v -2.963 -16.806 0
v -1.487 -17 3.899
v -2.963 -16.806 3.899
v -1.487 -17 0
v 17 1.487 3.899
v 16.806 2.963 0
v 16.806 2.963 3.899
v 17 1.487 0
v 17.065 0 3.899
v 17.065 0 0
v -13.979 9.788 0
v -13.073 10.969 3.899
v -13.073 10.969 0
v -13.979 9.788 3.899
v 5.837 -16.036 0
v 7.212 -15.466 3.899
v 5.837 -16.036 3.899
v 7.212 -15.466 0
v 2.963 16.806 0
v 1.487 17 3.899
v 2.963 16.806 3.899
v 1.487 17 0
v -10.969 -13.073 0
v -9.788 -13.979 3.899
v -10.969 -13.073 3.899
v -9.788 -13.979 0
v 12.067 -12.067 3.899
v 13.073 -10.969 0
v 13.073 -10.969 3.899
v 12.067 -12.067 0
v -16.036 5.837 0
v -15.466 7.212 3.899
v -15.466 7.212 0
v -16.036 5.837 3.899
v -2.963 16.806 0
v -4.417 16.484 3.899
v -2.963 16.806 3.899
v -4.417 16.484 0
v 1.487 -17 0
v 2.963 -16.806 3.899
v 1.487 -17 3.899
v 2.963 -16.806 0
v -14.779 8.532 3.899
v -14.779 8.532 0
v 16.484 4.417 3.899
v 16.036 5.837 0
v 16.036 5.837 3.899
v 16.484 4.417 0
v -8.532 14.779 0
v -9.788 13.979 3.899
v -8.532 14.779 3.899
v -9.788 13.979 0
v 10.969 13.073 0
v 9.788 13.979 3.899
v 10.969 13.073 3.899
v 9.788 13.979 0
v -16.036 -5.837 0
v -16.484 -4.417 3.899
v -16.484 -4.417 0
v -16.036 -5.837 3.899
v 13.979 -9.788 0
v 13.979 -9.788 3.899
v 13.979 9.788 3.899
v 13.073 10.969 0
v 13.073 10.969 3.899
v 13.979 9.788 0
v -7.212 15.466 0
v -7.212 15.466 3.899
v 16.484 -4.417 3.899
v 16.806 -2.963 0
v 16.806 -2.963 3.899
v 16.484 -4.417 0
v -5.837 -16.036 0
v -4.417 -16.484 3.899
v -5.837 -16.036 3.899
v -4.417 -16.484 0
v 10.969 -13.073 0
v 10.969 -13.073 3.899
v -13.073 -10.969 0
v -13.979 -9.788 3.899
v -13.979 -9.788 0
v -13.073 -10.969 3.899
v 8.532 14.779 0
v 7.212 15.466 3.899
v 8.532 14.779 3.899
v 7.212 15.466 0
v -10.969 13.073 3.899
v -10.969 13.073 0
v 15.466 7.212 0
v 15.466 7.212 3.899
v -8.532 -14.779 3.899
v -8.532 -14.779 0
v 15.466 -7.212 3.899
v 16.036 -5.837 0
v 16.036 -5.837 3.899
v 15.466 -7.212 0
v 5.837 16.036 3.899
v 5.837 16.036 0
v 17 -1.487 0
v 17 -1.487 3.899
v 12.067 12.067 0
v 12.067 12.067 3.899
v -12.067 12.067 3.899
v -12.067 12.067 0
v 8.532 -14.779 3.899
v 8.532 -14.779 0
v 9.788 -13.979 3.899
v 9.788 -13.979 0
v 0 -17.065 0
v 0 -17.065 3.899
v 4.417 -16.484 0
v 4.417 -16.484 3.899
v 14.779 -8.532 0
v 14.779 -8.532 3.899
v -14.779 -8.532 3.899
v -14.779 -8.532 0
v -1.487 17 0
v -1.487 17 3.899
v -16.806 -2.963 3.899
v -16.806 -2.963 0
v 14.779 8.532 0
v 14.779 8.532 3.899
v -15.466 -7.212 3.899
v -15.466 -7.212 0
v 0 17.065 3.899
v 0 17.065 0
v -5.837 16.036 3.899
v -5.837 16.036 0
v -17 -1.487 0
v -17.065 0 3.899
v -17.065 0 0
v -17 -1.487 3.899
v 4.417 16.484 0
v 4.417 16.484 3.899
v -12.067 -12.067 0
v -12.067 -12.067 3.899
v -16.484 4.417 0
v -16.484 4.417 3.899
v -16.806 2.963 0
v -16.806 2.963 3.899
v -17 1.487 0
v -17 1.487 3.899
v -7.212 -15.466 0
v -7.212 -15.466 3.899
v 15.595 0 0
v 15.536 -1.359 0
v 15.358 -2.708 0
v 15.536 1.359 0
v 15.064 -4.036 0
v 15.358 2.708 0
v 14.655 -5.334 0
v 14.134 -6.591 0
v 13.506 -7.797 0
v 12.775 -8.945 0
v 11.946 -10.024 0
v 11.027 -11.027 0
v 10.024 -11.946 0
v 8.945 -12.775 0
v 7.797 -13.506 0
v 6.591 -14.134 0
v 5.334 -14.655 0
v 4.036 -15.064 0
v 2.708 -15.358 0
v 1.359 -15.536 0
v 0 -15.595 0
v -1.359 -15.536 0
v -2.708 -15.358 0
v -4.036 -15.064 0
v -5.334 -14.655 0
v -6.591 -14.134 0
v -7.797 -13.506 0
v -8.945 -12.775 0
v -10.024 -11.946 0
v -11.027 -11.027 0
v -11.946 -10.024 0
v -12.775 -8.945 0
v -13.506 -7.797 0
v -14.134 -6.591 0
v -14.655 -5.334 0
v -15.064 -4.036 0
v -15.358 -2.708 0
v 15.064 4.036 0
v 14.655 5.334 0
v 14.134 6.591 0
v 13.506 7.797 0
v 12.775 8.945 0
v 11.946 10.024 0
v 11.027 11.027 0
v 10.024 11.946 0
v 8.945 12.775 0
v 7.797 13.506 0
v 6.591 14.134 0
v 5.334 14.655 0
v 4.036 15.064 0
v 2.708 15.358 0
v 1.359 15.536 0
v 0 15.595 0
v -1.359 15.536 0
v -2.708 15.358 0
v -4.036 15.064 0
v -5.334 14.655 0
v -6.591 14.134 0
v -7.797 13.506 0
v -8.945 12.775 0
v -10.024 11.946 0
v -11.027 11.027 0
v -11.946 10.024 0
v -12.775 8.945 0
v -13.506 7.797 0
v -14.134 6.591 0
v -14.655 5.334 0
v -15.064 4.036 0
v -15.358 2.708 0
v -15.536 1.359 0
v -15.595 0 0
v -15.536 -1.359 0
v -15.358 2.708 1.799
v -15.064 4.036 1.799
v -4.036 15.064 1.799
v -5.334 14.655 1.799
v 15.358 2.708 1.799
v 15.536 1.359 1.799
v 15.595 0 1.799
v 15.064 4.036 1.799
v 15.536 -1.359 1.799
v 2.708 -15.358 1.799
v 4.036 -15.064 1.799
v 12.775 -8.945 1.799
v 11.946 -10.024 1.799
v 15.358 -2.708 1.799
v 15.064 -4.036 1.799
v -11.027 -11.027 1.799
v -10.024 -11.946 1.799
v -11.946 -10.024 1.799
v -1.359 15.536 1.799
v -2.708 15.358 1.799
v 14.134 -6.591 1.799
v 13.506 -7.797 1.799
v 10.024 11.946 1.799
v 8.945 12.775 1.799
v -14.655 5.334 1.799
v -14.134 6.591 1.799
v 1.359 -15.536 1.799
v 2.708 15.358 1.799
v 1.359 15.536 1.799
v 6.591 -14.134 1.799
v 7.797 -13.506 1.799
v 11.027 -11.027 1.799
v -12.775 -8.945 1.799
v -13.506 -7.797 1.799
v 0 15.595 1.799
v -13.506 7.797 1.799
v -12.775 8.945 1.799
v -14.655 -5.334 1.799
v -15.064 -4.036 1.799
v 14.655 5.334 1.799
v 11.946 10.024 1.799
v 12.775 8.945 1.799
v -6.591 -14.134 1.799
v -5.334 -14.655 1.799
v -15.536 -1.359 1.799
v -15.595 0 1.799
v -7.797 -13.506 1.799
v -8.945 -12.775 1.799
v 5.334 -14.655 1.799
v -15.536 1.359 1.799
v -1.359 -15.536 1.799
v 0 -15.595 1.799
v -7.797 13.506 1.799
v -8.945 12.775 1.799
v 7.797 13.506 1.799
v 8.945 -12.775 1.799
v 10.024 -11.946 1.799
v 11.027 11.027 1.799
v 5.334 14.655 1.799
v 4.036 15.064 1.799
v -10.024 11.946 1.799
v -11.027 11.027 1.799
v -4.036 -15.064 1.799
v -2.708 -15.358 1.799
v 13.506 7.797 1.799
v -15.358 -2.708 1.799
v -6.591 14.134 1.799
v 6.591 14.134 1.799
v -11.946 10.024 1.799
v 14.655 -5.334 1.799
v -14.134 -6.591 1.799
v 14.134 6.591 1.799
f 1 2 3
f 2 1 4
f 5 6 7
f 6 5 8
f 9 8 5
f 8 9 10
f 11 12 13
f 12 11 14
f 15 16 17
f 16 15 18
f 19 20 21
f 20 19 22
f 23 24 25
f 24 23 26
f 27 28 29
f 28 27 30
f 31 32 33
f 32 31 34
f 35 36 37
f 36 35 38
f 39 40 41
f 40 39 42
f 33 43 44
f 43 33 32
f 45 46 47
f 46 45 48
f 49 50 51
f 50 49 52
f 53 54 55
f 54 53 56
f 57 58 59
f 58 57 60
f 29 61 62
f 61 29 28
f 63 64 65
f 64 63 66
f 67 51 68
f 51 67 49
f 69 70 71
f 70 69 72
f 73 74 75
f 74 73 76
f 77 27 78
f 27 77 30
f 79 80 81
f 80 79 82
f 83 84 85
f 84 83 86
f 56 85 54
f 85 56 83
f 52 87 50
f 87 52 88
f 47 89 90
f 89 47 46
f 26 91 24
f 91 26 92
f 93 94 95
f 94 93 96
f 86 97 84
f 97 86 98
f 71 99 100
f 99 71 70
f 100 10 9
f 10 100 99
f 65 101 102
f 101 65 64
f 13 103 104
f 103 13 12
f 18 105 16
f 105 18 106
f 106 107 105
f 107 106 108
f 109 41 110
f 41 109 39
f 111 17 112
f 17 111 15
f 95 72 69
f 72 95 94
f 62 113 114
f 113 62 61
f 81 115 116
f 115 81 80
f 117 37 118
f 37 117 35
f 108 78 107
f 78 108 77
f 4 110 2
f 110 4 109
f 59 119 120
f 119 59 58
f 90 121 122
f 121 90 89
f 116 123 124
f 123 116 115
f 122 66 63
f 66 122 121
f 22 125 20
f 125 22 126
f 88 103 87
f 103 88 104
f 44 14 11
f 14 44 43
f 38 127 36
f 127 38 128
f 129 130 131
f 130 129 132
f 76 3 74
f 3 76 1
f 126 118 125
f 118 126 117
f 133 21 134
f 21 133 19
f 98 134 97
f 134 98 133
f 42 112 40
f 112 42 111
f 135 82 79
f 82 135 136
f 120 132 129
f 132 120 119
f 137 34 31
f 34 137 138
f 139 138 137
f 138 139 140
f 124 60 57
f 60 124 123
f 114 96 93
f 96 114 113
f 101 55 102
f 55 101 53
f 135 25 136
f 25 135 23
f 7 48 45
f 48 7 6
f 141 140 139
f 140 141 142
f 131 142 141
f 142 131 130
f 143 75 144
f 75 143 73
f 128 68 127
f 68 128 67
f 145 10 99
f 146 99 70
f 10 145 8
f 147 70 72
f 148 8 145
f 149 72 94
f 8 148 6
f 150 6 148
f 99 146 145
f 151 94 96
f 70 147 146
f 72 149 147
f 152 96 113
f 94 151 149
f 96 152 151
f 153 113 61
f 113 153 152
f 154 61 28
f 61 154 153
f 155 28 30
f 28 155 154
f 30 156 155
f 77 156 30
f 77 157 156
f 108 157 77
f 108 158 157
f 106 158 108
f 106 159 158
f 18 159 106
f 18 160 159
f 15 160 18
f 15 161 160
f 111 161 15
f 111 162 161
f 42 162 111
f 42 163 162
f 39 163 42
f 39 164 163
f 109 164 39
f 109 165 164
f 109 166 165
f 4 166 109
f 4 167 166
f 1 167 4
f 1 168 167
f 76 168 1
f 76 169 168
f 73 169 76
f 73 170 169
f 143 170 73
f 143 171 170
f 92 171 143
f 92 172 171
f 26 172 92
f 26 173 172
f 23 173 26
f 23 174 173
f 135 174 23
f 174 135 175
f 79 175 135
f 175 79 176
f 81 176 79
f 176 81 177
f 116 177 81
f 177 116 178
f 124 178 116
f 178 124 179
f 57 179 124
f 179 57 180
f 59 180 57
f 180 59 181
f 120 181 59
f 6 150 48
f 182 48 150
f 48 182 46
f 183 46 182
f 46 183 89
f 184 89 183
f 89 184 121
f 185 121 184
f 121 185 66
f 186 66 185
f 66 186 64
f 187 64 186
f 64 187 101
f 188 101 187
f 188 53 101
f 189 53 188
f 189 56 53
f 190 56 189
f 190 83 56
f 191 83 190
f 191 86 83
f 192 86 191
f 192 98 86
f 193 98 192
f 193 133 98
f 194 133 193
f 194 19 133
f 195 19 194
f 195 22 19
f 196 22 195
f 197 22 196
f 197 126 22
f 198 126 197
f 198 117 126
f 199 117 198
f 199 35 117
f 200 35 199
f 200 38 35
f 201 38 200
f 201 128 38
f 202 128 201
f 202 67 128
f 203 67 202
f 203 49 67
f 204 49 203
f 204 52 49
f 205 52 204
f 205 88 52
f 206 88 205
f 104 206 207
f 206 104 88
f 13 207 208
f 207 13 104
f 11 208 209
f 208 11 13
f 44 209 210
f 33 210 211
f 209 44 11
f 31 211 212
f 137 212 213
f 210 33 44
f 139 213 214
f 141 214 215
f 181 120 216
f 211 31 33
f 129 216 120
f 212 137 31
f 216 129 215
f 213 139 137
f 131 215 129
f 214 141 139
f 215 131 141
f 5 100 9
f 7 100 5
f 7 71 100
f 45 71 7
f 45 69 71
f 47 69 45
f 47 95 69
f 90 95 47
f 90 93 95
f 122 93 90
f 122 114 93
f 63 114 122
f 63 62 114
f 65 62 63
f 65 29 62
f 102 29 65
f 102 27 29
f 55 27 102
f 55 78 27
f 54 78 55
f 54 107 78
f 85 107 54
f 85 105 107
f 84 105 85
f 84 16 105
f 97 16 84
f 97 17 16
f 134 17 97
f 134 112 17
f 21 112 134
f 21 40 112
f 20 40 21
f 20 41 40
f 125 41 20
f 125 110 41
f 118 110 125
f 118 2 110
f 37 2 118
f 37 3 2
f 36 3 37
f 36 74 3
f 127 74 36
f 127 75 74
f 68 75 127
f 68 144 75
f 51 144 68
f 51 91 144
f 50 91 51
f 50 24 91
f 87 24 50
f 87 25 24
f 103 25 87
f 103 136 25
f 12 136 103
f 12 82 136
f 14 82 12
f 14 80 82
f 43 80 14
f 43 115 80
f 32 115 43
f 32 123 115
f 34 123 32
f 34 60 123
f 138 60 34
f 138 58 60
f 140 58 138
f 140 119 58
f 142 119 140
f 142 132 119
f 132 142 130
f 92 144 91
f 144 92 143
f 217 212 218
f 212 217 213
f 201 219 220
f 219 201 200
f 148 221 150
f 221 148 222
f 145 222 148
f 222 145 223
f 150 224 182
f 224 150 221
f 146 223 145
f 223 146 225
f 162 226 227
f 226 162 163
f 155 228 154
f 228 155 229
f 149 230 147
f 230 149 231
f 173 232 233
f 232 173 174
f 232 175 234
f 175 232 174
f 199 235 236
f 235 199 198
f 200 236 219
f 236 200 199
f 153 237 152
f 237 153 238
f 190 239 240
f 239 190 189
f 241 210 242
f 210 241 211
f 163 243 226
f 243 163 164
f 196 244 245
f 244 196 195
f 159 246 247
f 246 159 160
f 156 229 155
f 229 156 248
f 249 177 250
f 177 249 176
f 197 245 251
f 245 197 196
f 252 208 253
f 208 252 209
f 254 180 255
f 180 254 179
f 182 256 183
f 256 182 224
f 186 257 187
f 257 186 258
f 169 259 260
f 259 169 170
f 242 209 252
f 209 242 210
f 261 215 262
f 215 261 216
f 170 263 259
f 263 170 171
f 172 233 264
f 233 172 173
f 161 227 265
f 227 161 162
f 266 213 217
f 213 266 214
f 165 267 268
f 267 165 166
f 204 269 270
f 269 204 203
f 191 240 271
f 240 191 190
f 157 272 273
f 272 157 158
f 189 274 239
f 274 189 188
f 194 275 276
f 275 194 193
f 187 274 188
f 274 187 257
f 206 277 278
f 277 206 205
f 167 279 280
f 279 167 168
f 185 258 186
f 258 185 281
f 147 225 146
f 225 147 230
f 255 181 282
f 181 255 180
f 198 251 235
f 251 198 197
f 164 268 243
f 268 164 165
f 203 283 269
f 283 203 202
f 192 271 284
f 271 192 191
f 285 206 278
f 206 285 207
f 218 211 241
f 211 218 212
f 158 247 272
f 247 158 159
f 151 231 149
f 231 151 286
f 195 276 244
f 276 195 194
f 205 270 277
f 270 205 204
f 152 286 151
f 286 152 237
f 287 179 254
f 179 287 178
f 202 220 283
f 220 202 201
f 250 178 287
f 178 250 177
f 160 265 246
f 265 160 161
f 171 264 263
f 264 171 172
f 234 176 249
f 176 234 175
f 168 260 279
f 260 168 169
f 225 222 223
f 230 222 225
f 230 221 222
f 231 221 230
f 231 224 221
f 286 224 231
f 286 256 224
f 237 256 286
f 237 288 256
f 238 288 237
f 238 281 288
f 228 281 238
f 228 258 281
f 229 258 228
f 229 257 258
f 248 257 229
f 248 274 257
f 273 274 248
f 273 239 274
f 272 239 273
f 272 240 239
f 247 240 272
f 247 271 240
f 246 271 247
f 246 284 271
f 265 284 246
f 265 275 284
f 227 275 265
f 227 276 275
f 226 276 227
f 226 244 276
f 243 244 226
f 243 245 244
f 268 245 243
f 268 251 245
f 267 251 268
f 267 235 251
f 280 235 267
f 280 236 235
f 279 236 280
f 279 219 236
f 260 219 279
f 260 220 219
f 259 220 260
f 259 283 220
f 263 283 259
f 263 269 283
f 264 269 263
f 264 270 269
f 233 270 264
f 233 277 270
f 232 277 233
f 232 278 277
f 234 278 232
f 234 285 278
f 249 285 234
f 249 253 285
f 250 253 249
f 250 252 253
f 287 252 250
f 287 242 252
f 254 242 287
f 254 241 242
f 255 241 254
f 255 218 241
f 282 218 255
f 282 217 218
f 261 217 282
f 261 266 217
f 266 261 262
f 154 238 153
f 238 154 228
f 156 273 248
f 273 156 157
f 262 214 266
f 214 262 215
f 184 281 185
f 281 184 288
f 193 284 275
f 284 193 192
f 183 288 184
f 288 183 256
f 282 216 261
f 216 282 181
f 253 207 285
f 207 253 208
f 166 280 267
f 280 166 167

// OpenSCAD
$fn=72;

f=0.42*7;
d=28.25+f;
h=d/8;

difference(){
cylinder(h=h, d=d+f);
    
    
   translate([0,0,0]);
    cylinder(h=h-0.15*14, d=d);
    
}
